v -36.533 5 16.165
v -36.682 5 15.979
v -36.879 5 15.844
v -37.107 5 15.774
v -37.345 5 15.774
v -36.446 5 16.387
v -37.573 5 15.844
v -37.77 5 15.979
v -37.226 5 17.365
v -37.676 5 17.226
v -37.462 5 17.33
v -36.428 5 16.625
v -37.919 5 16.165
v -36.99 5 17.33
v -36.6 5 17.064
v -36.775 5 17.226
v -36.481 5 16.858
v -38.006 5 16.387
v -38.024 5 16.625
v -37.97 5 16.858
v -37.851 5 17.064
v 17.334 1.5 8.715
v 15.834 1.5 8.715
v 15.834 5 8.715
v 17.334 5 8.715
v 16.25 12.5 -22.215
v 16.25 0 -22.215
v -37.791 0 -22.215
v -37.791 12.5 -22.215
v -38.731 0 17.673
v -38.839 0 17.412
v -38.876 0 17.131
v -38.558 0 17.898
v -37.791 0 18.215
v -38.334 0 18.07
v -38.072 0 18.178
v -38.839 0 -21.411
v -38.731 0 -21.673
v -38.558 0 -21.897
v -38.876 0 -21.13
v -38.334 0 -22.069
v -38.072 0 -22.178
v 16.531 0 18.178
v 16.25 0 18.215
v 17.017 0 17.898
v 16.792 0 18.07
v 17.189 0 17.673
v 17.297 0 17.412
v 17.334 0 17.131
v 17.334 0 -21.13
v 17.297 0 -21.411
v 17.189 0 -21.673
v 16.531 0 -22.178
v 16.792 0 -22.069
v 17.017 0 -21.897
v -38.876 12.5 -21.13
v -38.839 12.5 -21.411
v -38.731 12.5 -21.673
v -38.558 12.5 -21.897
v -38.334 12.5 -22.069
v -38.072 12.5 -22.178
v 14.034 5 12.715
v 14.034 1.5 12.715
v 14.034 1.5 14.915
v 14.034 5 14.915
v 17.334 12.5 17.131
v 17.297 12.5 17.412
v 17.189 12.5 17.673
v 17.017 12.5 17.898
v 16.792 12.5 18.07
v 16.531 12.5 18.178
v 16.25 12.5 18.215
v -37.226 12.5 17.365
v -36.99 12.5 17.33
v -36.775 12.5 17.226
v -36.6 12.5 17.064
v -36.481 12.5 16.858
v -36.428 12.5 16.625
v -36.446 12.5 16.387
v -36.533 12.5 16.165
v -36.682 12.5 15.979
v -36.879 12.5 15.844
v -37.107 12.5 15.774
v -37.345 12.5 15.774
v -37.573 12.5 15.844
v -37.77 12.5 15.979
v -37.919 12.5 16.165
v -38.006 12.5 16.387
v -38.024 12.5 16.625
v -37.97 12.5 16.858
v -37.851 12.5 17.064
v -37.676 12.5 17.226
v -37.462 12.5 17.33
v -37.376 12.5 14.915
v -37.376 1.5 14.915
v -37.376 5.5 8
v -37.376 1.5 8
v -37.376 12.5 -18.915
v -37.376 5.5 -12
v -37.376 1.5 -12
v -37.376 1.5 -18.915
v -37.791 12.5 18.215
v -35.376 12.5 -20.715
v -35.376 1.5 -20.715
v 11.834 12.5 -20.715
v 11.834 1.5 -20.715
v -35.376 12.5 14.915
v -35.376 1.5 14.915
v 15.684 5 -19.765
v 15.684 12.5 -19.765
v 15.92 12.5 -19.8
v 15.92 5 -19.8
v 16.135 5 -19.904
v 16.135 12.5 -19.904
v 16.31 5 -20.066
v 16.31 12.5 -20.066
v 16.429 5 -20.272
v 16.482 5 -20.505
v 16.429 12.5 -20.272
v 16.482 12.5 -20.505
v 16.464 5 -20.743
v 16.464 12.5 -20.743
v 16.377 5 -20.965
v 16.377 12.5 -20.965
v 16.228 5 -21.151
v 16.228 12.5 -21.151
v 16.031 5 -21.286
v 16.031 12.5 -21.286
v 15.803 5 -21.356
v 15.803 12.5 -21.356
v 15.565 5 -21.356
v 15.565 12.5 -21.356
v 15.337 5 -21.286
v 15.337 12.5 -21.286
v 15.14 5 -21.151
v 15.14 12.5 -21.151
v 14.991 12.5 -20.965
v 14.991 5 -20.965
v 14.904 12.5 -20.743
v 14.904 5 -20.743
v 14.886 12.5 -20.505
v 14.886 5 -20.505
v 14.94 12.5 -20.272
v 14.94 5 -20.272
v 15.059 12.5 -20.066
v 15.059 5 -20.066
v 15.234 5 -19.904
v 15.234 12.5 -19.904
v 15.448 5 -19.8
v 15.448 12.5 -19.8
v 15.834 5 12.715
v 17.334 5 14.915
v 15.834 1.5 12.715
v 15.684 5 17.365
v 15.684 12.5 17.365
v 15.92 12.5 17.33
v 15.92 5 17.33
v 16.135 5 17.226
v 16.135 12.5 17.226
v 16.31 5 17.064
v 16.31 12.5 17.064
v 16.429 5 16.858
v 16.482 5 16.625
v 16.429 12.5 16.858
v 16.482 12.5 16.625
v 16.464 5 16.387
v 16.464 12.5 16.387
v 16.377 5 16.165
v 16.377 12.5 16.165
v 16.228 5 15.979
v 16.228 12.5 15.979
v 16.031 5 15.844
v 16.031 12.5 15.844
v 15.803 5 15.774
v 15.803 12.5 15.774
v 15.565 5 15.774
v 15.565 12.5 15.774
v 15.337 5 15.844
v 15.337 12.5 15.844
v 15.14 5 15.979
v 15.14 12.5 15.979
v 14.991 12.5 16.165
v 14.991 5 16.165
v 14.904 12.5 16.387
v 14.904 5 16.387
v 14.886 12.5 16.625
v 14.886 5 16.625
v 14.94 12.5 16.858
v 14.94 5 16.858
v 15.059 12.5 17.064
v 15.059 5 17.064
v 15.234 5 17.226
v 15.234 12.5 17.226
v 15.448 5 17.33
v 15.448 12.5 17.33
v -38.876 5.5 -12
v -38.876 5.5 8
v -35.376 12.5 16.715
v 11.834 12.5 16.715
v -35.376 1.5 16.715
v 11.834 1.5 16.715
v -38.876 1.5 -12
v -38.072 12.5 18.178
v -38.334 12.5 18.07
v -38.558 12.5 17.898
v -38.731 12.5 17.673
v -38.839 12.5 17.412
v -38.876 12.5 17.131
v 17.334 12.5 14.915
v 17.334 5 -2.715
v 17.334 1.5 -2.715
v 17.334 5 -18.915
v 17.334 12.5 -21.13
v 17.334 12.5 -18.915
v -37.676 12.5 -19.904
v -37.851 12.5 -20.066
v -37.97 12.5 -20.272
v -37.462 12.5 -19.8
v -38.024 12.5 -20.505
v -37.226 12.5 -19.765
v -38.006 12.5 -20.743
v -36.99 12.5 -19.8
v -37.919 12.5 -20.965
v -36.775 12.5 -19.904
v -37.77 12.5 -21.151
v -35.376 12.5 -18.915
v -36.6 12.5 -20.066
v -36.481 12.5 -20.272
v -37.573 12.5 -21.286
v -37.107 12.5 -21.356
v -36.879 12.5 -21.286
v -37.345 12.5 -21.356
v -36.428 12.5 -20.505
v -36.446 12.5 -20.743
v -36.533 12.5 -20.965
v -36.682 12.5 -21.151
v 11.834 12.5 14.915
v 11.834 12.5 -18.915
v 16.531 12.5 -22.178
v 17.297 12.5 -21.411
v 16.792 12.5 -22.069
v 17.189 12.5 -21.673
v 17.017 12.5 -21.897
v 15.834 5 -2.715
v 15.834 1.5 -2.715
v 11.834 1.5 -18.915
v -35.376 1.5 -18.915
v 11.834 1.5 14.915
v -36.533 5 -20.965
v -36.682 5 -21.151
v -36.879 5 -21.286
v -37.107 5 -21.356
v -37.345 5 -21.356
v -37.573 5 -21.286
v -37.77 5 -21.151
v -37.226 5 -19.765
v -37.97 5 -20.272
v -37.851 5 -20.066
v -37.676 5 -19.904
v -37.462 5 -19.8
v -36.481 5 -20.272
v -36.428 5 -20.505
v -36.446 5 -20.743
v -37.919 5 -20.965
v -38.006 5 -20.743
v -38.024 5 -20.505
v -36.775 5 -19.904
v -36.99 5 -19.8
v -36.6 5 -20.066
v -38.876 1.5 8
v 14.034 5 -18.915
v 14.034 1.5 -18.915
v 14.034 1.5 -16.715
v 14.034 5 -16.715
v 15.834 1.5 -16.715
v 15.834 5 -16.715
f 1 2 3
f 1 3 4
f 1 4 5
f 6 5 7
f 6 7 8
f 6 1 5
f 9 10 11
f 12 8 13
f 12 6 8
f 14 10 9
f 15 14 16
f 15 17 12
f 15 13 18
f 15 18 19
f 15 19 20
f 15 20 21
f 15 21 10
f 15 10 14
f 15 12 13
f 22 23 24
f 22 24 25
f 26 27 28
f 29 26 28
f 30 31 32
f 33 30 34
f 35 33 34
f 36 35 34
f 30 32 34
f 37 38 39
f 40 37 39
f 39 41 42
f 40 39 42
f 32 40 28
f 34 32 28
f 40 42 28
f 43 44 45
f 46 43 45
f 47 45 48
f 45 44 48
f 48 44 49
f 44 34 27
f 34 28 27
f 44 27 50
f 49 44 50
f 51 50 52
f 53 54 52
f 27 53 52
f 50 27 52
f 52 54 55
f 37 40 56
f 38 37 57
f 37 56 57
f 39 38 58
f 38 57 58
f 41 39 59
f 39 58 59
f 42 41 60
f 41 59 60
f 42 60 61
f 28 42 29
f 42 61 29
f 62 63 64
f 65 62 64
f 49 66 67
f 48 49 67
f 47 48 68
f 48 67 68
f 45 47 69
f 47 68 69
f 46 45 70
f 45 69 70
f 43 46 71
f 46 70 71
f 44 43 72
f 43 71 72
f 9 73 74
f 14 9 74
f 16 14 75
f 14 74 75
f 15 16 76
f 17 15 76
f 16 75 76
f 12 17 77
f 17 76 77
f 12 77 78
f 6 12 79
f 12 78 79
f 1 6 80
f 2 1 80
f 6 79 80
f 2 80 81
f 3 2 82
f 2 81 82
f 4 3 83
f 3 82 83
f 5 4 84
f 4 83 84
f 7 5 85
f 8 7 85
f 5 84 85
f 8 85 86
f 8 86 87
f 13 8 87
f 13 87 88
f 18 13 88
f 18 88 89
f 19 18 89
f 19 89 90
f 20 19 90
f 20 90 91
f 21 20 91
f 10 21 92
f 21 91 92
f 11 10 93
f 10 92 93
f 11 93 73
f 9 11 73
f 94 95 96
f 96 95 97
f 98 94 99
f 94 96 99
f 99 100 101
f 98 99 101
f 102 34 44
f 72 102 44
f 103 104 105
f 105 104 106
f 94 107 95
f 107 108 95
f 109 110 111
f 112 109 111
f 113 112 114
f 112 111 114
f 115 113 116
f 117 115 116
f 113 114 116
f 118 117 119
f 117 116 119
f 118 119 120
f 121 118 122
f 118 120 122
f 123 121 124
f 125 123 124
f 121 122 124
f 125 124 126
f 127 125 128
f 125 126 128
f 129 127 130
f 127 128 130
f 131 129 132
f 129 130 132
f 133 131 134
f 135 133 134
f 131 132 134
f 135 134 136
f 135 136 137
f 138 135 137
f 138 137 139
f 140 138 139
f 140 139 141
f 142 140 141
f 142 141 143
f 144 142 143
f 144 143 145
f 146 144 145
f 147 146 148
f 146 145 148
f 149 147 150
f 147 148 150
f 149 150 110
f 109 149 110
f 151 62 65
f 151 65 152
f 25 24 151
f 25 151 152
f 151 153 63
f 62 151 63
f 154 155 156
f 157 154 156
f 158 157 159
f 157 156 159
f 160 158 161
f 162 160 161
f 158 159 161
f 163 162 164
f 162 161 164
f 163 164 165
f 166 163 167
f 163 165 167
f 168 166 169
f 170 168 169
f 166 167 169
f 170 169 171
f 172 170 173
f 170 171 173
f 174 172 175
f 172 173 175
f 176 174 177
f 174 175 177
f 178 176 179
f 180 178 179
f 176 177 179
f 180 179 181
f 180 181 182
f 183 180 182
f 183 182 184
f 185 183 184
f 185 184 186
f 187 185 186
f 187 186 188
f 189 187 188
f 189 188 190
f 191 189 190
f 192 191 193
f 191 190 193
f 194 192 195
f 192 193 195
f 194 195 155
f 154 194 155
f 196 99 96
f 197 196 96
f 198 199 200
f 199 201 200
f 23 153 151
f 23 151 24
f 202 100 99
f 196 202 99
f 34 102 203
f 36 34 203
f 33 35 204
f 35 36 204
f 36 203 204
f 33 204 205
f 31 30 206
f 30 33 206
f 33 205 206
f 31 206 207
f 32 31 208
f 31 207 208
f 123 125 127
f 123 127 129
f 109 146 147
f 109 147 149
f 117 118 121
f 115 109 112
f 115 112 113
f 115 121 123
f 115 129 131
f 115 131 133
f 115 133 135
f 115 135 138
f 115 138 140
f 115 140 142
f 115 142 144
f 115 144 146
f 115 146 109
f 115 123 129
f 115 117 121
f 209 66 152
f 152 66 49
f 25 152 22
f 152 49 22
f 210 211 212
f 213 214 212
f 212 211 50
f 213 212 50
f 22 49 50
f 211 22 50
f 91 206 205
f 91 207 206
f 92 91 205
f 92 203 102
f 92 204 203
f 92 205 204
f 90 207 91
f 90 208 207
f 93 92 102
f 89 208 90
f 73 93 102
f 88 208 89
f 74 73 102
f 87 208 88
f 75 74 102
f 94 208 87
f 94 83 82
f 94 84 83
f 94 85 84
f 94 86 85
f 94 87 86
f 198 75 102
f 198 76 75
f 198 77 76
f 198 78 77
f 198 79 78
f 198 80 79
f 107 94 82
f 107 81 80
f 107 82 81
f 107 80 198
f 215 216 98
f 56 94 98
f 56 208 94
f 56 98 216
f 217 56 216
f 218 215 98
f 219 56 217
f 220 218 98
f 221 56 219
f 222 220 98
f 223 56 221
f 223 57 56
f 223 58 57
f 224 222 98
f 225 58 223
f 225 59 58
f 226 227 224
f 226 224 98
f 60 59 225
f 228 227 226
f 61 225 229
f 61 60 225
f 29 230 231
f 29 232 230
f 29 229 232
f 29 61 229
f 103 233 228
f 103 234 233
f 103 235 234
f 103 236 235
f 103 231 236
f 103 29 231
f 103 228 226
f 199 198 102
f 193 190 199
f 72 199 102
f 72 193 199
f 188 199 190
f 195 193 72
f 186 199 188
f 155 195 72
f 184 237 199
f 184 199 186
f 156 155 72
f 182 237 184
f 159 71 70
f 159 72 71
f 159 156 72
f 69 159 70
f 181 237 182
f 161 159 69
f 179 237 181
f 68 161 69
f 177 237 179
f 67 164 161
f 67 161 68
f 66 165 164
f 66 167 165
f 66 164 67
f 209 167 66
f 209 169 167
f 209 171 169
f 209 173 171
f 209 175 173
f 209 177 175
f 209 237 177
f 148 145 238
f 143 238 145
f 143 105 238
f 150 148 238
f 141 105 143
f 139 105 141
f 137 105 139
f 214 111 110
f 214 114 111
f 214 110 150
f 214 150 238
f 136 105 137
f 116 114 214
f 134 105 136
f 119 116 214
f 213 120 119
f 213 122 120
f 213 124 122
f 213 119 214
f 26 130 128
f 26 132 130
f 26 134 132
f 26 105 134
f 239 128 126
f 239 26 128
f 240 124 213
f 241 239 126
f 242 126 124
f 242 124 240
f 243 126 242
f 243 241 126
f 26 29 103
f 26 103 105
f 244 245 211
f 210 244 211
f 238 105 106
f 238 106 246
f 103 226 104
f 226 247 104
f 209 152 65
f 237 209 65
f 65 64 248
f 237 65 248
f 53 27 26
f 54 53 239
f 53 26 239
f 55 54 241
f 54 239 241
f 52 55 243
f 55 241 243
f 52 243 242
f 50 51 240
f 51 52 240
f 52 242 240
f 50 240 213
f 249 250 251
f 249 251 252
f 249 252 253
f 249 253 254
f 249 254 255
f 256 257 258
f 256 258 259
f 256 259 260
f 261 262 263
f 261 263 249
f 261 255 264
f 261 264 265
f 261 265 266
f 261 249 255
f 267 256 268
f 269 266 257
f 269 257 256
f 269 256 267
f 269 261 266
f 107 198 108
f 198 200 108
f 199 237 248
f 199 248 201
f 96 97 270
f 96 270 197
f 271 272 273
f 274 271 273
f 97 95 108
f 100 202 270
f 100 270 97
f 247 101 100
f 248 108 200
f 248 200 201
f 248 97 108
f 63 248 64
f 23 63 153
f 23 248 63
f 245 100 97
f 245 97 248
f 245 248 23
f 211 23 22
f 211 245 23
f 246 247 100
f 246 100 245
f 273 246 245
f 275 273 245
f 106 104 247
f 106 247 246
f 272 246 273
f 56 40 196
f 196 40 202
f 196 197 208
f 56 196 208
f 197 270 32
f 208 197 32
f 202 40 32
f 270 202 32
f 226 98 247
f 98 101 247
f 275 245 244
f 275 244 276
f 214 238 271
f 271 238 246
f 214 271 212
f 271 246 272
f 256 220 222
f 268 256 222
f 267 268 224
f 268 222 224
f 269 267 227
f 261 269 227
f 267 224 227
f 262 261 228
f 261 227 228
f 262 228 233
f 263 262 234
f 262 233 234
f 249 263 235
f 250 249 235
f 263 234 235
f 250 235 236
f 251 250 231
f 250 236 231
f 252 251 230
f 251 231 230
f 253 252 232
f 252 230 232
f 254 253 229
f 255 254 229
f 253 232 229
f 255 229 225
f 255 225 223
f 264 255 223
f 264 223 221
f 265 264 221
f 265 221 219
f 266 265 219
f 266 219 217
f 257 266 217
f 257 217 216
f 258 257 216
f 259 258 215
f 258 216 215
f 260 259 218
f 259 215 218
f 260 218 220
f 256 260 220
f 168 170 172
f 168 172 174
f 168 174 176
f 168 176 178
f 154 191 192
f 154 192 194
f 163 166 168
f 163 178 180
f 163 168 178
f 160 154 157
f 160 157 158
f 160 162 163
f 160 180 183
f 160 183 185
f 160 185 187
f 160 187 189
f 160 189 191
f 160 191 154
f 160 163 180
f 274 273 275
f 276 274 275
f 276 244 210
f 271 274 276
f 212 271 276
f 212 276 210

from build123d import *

# Parameters (mm, degrees)
SKETCH_1_W          = 56.21
SKETCH_1_H          = 40.43
EXTRUDE_1_DEPTH     = 1.5
SKETCH_2_W          = 54.71
SKETCH_2_H          = 1.5
EXTRUDE_2_DEPTH     = 3.5
SKETCH_3_W          = 1.5
SKETCH_3_H          = 8
SKETCH_3_H_2        = 18
EXTRUDE_3_DEPTH     = 3.5
SKETCH_4_W          = 2.2
SKETCH_4_H          = 1.8
EXTRUDE_4_DEPTH     = 3.5
SKETCH_5_W          = 2
SKETCH_5_H          = 1.8
EXTRUDE_5_DEPTH     = 3.5
EXTRUDE_9_DEPTH     = 7.5
SKETCH_9_R          = 0.8
CUT_EXTRUDE_1_DEPTH = 7.5
SKETCH_11_W         = 10
SKETCH_11_H         = 4
CUT_EXTRUDE_2_DEPTH = 7.5
CUT_EXTRUDE_3_DEPTH = 15


with BuildPart() as part:
    # 草图1 → 凸台-拉伸1 (new body)
    with BuildSketch(Plane(origin=(0, 0, 0), x_dir=(1, 0, 0), z_dir=(0, 1, 0))):
        with Locations((-10.770778443, 1.999730539)):
            Rectangle(SKETCH_1_W, SKETCH_1_H)
    extrude(amount=EXTRUDE_1_DEPTH)

    # 草图2 → 凸台-拉伸2 (add)
    with BuildSketch(Plane(origin=(0, 1.5, 0), x_dir=(1, 0, 0), z_dir=(0, 1, 0))):
        Polygon((-37.375778443, 22.214730539), (-38.875778443, 22.214730539), (-38.875778443, -18.215269461), (-37.375778443, -18.215269461), (-37.375778443, -16.715269461), (-37.375778443, 20.714730539), align=None)
        with Locations((-10.020778443, 21.464730539)):
            Rectangle(SKETCH_2_W, SKETCH_2_H)
        with Locations((-10.020778443, -17.465269461)):
            Rectangle(SKETCH_2_W, SKETCH_2_H)
    extrude(amount=EXTRUDE_2_DEPTH)

    # 草图3 → 凸台-拉伸3 (add)
    with BuildSketch(Plane(origin=(0, 1.5, 0), x_dir=(1, 0, 0), z_dir=(0, 1, 0))):
        with Locations((16.584221557, -12.715269461)):
            Rectangle(SKETCH_3_W, SKETCH_3_H)
        with Locations((16.584221557, 11.714730539)):
            Rectangle(SKETCH_3_W, SKETCH_3_H_2)
    extrude(amount=EXTRUDE_3_DEPTH)

    # 草图4 → 凸台-拉伸4 (add)
    with BuildSketch(Plane(origin=(0, 1.5, 0), x_dir=(1, 0, 0), z_dir=(0, 1, 0))):
        with Locations((12.934221557, 19.814730539)):
            Rectangle(SKETCH_4_W, SKETCH_4_H)
        Polygon((15.834221557, 16.714730539), (15.834221557, 20.714730539), (14.034221557, 20.714730539), (14.034221557, 18.914730539), (14.034221557, 16.714730539), align=None)
        Polygon((14.034221557, -16.715269461), (15.834221557, -16.715269461), (15.834221557, -12.715269461), (14.034221557, -12.715269461), (14.034221557, -14.915269461), align=None)
        with Locations((12.934221557, -15.815269461)):
            Rectangle(SKETCH_4_W, SKETCH_4_H)
    extrude(amount=EXTRUDE_4_DEPTH)

    # 草图5 → 凸台-拉伸5 (add)
    with BuildSketch(Plane(origin=(0, 1.5, 0), x_dir=(1, 0, 0), z_dir=(0, 1, 0))):
        with Locations((-36.375778443, 19.814730539)):
            Rectangle(SKETCH_5_W, SKETCH_5_H)
        with Locations((-36.375778443, -15.815269461)):
            Rectangle(SKETCH_5_W, SKETCH_5_H)
    extrude(amount=EXTRUDE_5_DEPTH)

    # 草图8 → 凸台-拉伸9 (add)
    with BuildSketch(Plane(origin=(0, 5, 0), x_dir=(1, 0, 0), z_dir=(0, 1, 0))):
        Polygon((17.334221557, -14.915269461), (14.034221557, -14.915269461), (11.834221557, -14.915269461), (11.834221557, -16.715269461), (-35.375778443, -16.715269461), (-35.375778443, -14.915269461), (-37.375778443, -14.915269461), (-37.375778443, 18.914730539), (-35.375778443, 18.914730539), (-35.375778443, 20.714730539), (11.834221557, 20.714730539), (11.834221557, 18.914730539), (14.034221557, 18.914730539), (17.334221557, 18.914730539), (17.334221557, 22.214730539), (-38.875778443, 22.214730539), (-38.875778443, -18.215269461), (17.334221557, -18.215269461), align=None)
    extrude(amount=EXTRUDE_9_DEPTH)

    # 草图9 → 切除-拉伸1 (cut)
    with BuildSketch(Plane(origin=(0, 12.5, 0), x_dir=(1, 0, 0), z_dir=(0, 1, 0))):
        with Locations(Location((15.684221557, 20.564730539, 0), (0, 0, 270))):
            Circle(SKETCH_9_R)
        with Locations(Location((15.684221557, -16.565269461, 0), (0, 0, 270))):
            Circle(SKETCH_9_R)
        with Locations(Location((-37.225778443, 20.564730539, 0), (0, 0, 270))):
            Circle(SKETCH_9_R)
        with Locations(Location((-37.225778443, -16.565269461, 0), (0, 0, 270))):
            Circle(SKETCH_9_R)
    extrude(amount=-CUT_EXTRUDE_1_DEPTH, mode=Mode.SUBTRACT)

    # 草图11 → 切除-拉伸2 (cut)
    with BuildSketch(Plane(origin=(-37.375778443, 0, 0), x_dir=(0, 0, -1), z_dir=(1, 0, 0))):
        with Locations((6.999730539, 3.5)):
            Rectangle(SKETCH_11_W, SKETCH_11_H)
        with Locations((-3.000269461, 3.5)):
            Rectangle(SKETCH_11_W, SKETCH_11_H)
    extrude(amount=-CUT_EXTRUDE_2_DEPTH, mode=Mode.SUBTRACT)

    # 草图14 → 切除-拉伸3 (cut)
    with BuildSketch(Plane(origin=(0, 12.5, 0), x_dir=(1, 0, 0), z_dir=(0, 1, 0))):
        with BuildLine():
            Line((-38.875778443, 22.214730539), (-38.875778443, 21.130415964))
            ThreePointArc((-38.875778443, 21.130415964), (-38.558190057, 21.897142153), (-37.791463868, 22.214730539))
            Line((-37.791463868, 22.214730539), (-38.875778443, 22.214730539))
        make_face()
        with BuildLine():
            ThreePointArc((-37.791463868, -18.215269461), (-38.558190057, -17.897681075), (-38.875778443, -17.130954886))
            Line((-38.875778443, -17.130954886), (-38.875778443, -18.215269461))
            Line((-38.875778443, -18.215269461), (-37.791463868, -18.215269461))
        make_face()
        with BuildLine():
            ThreePointArc((17.334221557, -17.130954886), (17.016633171, -17.897681075), (16.249906982, -18.215269461))
            Line((16.249906982, -18.215269461), (17.334221557, -18.215269461))
            Line((17.334221557, -18.215269461), (17.334221557, -17.130954886))
        make_face()
        with BuildLine():
            Line((17.334221557, 22.214730539), (16.249906982, 22.214730539))
            ThreePointArc((16.249906982, 22.214730539), (17.016633171, 21.897142153), (17.334221557, 21.130415964))
            Line((17.334221557, 21.130415964), (17.334221557, 22.214730539))
        make_face()
    extrude(amount=-CUT_EXTRUDE_3_DEPTH, mode=Mode.SUBTRACT)


solid = part.part
